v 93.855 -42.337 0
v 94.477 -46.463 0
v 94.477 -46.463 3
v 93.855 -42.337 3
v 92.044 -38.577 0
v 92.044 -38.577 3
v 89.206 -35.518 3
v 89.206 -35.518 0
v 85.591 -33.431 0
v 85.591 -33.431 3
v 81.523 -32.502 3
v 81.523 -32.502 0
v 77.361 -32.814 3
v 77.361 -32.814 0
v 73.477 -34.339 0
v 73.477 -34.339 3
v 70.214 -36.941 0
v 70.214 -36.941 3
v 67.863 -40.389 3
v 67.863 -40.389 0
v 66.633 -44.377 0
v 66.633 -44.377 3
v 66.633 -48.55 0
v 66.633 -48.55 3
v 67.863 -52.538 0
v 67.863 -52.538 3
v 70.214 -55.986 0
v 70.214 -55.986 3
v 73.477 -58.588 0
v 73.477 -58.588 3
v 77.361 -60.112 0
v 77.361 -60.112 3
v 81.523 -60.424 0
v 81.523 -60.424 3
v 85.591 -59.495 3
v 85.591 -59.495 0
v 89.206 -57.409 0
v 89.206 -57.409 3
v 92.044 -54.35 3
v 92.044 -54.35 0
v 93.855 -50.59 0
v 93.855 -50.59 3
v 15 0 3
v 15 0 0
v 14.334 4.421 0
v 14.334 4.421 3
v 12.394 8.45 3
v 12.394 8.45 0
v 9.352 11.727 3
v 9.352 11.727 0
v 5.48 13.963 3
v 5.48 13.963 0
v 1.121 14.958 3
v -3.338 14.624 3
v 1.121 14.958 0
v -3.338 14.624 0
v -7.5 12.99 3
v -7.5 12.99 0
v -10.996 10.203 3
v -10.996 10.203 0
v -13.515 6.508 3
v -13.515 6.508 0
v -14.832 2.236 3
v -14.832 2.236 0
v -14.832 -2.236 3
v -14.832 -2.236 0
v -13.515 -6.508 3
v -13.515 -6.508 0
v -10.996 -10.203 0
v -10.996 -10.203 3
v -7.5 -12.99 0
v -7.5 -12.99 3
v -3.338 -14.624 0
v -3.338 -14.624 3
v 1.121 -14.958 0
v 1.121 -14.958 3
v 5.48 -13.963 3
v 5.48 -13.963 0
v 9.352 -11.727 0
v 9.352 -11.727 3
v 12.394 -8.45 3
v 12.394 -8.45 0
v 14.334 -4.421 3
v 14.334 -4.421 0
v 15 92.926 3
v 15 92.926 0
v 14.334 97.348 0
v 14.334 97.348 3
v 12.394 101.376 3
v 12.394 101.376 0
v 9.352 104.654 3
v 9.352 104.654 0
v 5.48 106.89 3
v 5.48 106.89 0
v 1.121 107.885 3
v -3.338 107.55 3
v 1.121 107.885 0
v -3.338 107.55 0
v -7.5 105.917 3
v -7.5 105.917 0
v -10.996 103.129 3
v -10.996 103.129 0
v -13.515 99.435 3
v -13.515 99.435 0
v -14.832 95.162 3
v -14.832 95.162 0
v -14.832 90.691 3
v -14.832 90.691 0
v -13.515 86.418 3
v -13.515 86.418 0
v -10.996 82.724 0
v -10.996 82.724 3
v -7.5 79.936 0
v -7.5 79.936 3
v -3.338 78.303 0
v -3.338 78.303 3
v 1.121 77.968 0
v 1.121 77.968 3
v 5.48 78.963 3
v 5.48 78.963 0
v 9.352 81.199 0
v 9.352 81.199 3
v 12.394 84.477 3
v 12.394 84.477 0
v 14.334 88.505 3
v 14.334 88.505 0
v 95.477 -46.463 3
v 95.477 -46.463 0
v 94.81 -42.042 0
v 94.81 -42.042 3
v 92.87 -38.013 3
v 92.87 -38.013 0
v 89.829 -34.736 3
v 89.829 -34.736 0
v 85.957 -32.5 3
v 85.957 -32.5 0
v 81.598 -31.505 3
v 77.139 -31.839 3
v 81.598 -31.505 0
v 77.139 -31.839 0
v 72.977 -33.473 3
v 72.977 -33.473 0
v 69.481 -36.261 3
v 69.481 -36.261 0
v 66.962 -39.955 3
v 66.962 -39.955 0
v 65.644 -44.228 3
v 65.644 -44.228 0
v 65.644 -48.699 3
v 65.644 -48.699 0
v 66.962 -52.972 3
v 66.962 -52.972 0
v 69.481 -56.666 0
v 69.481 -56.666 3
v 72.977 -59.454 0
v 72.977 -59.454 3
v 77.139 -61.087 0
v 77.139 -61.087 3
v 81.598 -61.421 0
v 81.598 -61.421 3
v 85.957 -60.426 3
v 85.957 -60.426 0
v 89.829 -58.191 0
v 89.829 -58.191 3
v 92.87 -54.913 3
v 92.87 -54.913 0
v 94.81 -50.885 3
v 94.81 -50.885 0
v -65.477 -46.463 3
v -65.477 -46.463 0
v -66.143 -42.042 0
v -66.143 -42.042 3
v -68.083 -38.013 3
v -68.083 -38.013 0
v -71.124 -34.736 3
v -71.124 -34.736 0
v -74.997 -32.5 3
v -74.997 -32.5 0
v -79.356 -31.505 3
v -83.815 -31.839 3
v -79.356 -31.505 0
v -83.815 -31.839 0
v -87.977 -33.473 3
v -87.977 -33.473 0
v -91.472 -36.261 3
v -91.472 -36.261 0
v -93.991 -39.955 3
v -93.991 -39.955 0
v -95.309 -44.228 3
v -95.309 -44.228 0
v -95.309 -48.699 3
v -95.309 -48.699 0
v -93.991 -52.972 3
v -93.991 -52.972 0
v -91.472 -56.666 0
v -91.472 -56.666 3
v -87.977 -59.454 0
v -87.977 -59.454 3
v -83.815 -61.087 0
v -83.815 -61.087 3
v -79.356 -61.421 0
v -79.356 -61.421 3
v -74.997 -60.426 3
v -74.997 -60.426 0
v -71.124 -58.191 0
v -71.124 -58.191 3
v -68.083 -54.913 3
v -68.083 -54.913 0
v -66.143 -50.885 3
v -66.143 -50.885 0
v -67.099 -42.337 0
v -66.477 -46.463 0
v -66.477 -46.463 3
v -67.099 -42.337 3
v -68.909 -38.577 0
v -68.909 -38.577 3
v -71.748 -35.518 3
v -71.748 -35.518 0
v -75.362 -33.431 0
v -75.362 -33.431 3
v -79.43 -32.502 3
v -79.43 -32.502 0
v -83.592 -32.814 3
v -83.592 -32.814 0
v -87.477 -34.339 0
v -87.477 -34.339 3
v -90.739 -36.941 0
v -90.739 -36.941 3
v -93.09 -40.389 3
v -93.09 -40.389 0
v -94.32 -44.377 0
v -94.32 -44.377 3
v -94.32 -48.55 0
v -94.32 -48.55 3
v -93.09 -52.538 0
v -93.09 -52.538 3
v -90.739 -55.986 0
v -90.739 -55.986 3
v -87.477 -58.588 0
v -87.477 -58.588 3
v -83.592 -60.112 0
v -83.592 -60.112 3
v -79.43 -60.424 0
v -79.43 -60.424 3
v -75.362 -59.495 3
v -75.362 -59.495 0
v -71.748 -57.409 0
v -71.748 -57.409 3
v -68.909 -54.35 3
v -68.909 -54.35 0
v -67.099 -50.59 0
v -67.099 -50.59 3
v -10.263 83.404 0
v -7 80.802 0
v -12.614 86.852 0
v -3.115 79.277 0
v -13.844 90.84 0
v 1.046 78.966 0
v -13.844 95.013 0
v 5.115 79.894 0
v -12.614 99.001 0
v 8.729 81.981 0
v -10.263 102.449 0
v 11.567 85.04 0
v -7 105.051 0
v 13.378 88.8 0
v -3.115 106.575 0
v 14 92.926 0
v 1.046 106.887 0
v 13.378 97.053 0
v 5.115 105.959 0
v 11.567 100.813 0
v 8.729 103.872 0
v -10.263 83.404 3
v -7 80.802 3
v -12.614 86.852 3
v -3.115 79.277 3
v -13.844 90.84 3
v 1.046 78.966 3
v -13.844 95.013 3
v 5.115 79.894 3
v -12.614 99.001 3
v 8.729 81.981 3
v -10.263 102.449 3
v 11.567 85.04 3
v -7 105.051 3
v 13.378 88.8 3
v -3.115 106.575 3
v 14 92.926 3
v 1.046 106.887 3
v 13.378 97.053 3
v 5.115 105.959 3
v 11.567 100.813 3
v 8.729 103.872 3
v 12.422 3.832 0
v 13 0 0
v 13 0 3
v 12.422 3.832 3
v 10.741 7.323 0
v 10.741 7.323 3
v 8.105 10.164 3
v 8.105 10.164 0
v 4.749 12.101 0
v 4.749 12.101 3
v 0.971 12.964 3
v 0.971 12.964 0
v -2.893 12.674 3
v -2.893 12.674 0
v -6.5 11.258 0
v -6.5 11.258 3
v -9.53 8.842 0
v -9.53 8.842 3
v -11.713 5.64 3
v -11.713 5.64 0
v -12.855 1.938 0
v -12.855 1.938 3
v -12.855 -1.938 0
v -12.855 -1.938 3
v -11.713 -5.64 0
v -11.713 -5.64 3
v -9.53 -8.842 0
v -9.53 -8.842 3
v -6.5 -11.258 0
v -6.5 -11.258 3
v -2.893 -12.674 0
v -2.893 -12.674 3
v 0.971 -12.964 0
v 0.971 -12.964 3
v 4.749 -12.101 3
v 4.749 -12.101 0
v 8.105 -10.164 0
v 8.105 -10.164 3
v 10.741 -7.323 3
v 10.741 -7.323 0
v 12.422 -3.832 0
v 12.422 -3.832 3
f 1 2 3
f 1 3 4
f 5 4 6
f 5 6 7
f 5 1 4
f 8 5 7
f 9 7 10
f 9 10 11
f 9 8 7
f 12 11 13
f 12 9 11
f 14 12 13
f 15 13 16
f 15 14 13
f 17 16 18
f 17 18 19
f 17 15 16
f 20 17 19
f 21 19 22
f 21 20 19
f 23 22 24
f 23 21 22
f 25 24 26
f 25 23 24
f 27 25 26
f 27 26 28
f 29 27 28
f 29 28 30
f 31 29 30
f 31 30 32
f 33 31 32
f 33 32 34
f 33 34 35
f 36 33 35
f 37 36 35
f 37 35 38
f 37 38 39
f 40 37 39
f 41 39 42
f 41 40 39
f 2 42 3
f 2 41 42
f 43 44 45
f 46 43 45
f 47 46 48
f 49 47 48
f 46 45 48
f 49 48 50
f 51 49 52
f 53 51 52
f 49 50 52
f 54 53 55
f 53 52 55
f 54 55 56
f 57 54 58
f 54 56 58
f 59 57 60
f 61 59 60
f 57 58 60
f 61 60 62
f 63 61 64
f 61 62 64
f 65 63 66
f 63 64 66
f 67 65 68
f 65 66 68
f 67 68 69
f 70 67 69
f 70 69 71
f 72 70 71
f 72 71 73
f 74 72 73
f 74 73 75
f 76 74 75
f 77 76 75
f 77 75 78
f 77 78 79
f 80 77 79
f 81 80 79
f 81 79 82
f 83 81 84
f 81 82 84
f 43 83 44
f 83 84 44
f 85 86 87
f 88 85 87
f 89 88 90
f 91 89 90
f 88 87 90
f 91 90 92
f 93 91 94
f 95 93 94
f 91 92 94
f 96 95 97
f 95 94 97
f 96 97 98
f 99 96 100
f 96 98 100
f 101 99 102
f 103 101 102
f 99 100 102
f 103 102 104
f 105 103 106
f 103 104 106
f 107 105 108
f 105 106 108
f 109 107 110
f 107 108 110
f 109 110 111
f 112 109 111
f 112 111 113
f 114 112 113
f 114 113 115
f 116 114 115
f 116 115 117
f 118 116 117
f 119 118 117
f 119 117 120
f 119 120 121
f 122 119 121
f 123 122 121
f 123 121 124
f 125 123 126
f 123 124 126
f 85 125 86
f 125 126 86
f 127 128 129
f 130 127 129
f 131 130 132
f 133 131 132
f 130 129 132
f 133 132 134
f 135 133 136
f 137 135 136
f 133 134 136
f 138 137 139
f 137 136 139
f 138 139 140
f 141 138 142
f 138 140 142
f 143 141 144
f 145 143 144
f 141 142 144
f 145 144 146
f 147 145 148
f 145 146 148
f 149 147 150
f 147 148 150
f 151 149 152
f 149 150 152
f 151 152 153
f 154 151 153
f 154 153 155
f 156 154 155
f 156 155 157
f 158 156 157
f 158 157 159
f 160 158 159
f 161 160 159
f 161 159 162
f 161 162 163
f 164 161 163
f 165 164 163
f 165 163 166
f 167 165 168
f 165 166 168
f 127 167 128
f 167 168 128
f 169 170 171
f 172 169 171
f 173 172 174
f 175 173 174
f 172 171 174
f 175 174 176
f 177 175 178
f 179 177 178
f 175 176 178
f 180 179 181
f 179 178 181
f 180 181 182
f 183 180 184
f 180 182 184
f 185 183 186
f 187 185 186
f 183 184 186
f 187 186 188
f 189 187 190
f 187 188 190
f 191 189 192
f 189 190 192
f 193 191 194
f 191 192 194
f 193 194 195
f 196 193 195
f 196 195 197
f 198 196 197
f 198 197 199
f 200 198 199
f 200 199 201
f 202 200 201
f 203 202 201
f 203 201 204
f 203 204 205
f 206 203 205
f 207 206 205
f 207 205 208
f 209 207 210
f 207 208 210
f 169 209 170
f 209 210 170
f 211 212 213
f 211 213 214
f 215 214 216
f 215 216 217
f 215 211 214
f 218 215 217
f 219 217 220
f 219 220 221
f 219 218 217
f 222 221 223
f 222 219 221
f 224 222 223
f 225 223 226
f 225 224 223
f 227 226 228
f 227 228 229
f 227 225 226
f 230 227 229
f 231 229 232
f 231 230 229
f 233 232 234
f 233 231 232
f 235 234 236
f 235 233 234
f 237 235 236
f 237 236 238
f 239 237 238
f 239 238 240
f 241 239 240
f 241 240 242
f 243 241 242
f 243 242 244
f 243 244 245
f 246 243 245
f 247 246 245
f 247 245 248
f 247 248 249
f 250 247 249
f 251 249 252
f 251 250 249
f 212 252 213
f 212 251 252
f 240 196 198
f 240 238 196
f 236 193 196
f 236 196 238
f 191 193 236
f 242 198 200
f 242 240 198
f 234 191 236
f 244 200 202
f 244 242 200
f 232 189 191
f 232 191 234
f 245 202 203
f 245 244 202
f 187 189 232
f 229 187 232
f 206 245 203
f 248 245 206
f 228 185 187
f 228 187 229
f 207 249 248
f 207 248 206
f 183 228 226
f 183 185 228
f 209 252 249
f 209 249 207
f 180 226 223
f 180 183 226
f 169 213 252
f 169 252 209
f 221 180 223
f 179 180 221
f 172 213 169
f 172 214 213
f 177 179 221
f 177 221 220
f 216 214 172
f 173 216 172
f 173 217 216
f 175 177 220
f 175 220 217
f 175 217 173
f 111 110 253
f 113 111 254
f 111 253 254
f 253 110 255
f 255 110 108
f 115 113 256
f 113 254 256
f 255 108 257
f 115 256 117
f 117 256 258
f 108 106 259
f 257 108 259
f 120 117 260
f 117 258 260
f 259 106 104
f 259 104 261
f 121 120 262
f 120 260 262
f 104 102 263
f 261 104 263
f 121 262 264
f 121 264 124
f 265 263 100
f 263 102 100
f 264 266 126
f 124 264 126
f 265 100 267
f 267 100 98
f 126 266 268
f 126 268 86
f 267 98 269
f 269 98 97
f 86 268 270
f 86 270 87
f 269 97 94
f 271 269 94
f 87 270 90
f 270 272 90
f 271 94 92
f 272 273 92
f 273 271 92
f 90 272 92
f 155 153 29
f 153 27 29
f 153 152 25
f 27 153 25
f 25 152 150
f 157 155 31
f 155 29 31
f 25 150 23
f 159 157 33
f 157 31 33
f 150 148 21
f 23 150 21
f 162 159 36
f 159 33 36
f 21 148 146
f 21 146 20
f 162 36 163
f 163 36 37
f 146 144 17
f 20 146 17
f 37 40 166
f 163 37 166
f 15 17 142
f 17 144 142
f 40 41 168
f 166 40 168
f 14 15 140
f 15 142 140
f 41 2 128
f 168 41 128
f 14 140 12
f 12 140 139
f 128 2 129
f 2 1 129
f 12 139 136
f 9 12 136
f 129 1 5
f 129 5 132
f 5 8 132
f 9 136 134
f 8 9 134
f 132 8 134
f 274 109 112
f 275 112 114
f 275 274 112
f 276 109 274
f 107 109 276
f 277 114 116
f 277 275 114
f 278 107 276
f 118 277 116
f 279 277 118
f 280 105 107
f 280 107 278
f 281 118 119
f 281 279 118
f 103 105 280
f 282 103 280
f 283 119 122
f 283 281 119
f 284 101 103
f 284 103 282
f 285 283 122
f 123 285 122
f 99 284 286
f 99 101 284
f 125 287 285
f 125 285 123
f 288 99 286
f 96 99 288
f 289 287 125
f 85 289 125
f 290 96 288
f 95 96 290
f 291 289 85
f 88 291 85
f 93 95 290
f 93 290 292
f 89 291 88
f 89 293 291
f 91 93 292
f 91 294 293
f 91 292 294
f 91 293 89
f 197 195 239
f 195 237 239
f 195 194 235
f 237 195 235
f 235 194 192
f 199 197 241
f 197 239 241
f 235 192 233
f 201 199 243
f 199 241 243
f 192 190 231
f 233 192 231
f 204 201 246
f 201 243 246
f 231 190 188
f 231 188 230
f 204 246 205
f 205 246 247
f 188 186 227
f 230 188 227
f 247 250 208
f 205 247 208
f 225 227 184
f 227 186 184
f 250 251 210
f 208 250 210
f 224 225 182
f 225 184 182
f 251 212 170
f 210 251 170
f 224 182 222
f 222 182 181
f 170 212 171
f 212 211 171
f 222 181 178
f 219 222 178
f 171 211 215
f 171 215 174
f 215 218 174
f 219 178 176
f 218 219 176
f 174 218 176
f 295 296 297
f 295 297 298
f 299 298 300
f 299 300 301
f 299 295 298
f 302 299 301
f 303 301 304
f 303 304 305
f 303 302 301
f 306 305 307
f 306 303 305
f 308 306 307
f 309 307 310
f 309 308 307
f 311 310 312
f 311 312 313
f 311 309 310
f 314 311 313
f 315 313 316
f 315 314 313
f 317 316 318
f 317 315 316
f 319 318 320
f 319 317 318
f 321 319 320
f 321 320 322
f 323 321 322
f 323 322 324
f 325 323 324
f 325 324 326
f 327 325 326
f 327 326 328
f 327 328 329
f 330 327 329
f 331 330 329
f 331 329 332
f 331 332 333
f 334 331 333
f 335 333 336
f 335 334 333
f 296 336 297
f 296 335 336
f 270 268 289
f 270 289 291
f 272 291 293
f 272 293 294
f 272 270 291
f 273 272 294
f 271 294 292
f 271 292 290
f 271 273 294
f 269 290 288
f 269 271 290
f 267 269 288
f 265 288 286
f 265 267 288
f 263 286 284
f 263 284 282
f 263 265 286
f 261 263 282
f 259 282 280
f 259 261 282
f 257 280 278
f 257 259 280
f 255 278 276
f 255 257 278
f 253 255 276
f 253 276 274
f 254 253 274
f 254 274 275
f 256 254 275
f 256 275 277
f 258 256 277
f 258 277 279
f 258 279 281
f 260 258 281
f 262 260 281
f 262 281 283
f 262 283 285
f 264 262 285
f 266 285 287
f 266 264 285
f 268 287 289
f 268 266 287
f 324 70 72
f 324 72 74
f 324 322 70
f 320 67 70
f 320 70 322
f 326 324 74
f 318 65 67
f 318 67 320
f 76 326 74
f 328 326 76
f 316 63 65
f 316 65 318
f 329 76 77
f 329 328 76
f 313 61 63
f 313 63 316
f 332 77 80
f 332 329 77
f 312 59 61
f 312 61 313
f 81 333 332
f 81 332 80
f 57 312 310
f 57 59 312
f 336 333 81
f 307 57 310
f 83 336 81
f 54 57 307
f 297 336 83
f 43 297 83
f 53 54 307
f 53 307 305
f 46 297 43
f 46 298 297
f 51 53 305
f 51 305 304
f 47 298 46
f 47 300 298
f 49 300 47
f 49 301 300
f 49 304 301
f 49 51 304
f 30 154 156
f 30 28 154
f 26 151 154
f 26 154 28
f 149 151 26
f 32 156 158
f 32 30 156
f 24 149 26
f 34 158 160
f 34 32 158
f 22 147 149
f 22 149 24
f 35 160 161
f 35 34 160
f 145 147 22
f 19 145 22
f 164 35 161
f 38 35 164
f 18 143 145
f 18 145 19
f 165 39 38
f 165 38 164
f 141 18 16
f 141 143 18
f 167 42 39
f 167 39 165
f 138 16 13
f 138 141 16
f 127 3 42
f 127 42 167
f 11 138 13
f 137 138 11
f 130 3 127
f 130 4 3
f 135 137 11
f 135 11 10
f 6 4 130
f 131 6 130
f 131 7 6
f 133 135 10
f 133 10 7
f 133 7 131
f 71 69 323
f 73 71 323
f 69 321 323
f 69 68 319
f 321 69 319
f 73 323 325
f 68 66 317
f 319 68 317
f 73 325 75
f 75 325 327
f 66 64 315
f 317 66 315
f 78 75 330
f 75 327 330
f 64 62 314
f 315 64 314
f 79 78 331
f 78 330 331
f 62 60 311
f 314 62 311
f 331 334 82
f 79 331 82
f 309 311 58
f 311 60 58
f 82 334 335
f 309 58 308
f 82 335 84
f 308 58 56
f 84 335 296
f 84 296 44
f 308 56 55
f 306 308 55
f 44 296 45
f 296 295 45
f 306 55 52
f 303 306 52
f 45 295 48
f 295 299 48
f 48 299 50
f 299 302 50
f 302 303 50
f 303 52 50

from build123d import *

# Parameters (mm, degrees)
F0_R     = 15
F0_R_2   = 14
F1_DEPTH = 3
F0_R_3   = 13


# Not quite as in the source:
# - a feature names something its author has since deleted; it is built from what else it names


with BuildPart() as f1:
    # F0 (on Top) → F1 (new body)
    with BuildSketch(Plane.XY):
        with Locations((0, 92.926489729)):
            Circle(F0_R)
        with Locations((0, 92.926489729)):
            Circle(F0_R_2, mode=Mode.SUBTRACT)
    extrude(amount=F1_DEPTH)


with BuildPart() as f1b:
    # F0 (on Top) → F1, piece 2 (new body)
    with BuildSketch(Plane.XY):
        with Locations((80.4767007898, -46.4632448645)):
            Circle(F0_R)
        with Locations((80.4767007898, -46.4632448645)):
            Circle(F0_R_2, mode=Mode.SUBTRACT)
    extrude(amount=F1_DEPTH)


with BuildPart() as f1c:
    # F0 (on Top) → F1, piece 3 (new body)
    with BuildSketch(Plane.XY):
        Circle(F0_R)
        Circle(F0_R_3, mode=Mode.SUBTRACT)
    extrude(amount=F1_DEPTH)


with BuildPart() as f1d:
    # F0 (on Top) → F1, piece 4 (new body)
    with BuildSketch(Plane.XY):
        with Locations((-80.4767007898, -46.4632448645)):
            Circle(F0_R)
        with Locations((-80.4767007898, -46.4632448645)):
            Circle(F0_R_2, mode=Mode.SUBTRACT)
    extrude(amount=F1_DEPTH)


solid = Compound([f1.part, f1b.part, f1c.part, f1d.part])
